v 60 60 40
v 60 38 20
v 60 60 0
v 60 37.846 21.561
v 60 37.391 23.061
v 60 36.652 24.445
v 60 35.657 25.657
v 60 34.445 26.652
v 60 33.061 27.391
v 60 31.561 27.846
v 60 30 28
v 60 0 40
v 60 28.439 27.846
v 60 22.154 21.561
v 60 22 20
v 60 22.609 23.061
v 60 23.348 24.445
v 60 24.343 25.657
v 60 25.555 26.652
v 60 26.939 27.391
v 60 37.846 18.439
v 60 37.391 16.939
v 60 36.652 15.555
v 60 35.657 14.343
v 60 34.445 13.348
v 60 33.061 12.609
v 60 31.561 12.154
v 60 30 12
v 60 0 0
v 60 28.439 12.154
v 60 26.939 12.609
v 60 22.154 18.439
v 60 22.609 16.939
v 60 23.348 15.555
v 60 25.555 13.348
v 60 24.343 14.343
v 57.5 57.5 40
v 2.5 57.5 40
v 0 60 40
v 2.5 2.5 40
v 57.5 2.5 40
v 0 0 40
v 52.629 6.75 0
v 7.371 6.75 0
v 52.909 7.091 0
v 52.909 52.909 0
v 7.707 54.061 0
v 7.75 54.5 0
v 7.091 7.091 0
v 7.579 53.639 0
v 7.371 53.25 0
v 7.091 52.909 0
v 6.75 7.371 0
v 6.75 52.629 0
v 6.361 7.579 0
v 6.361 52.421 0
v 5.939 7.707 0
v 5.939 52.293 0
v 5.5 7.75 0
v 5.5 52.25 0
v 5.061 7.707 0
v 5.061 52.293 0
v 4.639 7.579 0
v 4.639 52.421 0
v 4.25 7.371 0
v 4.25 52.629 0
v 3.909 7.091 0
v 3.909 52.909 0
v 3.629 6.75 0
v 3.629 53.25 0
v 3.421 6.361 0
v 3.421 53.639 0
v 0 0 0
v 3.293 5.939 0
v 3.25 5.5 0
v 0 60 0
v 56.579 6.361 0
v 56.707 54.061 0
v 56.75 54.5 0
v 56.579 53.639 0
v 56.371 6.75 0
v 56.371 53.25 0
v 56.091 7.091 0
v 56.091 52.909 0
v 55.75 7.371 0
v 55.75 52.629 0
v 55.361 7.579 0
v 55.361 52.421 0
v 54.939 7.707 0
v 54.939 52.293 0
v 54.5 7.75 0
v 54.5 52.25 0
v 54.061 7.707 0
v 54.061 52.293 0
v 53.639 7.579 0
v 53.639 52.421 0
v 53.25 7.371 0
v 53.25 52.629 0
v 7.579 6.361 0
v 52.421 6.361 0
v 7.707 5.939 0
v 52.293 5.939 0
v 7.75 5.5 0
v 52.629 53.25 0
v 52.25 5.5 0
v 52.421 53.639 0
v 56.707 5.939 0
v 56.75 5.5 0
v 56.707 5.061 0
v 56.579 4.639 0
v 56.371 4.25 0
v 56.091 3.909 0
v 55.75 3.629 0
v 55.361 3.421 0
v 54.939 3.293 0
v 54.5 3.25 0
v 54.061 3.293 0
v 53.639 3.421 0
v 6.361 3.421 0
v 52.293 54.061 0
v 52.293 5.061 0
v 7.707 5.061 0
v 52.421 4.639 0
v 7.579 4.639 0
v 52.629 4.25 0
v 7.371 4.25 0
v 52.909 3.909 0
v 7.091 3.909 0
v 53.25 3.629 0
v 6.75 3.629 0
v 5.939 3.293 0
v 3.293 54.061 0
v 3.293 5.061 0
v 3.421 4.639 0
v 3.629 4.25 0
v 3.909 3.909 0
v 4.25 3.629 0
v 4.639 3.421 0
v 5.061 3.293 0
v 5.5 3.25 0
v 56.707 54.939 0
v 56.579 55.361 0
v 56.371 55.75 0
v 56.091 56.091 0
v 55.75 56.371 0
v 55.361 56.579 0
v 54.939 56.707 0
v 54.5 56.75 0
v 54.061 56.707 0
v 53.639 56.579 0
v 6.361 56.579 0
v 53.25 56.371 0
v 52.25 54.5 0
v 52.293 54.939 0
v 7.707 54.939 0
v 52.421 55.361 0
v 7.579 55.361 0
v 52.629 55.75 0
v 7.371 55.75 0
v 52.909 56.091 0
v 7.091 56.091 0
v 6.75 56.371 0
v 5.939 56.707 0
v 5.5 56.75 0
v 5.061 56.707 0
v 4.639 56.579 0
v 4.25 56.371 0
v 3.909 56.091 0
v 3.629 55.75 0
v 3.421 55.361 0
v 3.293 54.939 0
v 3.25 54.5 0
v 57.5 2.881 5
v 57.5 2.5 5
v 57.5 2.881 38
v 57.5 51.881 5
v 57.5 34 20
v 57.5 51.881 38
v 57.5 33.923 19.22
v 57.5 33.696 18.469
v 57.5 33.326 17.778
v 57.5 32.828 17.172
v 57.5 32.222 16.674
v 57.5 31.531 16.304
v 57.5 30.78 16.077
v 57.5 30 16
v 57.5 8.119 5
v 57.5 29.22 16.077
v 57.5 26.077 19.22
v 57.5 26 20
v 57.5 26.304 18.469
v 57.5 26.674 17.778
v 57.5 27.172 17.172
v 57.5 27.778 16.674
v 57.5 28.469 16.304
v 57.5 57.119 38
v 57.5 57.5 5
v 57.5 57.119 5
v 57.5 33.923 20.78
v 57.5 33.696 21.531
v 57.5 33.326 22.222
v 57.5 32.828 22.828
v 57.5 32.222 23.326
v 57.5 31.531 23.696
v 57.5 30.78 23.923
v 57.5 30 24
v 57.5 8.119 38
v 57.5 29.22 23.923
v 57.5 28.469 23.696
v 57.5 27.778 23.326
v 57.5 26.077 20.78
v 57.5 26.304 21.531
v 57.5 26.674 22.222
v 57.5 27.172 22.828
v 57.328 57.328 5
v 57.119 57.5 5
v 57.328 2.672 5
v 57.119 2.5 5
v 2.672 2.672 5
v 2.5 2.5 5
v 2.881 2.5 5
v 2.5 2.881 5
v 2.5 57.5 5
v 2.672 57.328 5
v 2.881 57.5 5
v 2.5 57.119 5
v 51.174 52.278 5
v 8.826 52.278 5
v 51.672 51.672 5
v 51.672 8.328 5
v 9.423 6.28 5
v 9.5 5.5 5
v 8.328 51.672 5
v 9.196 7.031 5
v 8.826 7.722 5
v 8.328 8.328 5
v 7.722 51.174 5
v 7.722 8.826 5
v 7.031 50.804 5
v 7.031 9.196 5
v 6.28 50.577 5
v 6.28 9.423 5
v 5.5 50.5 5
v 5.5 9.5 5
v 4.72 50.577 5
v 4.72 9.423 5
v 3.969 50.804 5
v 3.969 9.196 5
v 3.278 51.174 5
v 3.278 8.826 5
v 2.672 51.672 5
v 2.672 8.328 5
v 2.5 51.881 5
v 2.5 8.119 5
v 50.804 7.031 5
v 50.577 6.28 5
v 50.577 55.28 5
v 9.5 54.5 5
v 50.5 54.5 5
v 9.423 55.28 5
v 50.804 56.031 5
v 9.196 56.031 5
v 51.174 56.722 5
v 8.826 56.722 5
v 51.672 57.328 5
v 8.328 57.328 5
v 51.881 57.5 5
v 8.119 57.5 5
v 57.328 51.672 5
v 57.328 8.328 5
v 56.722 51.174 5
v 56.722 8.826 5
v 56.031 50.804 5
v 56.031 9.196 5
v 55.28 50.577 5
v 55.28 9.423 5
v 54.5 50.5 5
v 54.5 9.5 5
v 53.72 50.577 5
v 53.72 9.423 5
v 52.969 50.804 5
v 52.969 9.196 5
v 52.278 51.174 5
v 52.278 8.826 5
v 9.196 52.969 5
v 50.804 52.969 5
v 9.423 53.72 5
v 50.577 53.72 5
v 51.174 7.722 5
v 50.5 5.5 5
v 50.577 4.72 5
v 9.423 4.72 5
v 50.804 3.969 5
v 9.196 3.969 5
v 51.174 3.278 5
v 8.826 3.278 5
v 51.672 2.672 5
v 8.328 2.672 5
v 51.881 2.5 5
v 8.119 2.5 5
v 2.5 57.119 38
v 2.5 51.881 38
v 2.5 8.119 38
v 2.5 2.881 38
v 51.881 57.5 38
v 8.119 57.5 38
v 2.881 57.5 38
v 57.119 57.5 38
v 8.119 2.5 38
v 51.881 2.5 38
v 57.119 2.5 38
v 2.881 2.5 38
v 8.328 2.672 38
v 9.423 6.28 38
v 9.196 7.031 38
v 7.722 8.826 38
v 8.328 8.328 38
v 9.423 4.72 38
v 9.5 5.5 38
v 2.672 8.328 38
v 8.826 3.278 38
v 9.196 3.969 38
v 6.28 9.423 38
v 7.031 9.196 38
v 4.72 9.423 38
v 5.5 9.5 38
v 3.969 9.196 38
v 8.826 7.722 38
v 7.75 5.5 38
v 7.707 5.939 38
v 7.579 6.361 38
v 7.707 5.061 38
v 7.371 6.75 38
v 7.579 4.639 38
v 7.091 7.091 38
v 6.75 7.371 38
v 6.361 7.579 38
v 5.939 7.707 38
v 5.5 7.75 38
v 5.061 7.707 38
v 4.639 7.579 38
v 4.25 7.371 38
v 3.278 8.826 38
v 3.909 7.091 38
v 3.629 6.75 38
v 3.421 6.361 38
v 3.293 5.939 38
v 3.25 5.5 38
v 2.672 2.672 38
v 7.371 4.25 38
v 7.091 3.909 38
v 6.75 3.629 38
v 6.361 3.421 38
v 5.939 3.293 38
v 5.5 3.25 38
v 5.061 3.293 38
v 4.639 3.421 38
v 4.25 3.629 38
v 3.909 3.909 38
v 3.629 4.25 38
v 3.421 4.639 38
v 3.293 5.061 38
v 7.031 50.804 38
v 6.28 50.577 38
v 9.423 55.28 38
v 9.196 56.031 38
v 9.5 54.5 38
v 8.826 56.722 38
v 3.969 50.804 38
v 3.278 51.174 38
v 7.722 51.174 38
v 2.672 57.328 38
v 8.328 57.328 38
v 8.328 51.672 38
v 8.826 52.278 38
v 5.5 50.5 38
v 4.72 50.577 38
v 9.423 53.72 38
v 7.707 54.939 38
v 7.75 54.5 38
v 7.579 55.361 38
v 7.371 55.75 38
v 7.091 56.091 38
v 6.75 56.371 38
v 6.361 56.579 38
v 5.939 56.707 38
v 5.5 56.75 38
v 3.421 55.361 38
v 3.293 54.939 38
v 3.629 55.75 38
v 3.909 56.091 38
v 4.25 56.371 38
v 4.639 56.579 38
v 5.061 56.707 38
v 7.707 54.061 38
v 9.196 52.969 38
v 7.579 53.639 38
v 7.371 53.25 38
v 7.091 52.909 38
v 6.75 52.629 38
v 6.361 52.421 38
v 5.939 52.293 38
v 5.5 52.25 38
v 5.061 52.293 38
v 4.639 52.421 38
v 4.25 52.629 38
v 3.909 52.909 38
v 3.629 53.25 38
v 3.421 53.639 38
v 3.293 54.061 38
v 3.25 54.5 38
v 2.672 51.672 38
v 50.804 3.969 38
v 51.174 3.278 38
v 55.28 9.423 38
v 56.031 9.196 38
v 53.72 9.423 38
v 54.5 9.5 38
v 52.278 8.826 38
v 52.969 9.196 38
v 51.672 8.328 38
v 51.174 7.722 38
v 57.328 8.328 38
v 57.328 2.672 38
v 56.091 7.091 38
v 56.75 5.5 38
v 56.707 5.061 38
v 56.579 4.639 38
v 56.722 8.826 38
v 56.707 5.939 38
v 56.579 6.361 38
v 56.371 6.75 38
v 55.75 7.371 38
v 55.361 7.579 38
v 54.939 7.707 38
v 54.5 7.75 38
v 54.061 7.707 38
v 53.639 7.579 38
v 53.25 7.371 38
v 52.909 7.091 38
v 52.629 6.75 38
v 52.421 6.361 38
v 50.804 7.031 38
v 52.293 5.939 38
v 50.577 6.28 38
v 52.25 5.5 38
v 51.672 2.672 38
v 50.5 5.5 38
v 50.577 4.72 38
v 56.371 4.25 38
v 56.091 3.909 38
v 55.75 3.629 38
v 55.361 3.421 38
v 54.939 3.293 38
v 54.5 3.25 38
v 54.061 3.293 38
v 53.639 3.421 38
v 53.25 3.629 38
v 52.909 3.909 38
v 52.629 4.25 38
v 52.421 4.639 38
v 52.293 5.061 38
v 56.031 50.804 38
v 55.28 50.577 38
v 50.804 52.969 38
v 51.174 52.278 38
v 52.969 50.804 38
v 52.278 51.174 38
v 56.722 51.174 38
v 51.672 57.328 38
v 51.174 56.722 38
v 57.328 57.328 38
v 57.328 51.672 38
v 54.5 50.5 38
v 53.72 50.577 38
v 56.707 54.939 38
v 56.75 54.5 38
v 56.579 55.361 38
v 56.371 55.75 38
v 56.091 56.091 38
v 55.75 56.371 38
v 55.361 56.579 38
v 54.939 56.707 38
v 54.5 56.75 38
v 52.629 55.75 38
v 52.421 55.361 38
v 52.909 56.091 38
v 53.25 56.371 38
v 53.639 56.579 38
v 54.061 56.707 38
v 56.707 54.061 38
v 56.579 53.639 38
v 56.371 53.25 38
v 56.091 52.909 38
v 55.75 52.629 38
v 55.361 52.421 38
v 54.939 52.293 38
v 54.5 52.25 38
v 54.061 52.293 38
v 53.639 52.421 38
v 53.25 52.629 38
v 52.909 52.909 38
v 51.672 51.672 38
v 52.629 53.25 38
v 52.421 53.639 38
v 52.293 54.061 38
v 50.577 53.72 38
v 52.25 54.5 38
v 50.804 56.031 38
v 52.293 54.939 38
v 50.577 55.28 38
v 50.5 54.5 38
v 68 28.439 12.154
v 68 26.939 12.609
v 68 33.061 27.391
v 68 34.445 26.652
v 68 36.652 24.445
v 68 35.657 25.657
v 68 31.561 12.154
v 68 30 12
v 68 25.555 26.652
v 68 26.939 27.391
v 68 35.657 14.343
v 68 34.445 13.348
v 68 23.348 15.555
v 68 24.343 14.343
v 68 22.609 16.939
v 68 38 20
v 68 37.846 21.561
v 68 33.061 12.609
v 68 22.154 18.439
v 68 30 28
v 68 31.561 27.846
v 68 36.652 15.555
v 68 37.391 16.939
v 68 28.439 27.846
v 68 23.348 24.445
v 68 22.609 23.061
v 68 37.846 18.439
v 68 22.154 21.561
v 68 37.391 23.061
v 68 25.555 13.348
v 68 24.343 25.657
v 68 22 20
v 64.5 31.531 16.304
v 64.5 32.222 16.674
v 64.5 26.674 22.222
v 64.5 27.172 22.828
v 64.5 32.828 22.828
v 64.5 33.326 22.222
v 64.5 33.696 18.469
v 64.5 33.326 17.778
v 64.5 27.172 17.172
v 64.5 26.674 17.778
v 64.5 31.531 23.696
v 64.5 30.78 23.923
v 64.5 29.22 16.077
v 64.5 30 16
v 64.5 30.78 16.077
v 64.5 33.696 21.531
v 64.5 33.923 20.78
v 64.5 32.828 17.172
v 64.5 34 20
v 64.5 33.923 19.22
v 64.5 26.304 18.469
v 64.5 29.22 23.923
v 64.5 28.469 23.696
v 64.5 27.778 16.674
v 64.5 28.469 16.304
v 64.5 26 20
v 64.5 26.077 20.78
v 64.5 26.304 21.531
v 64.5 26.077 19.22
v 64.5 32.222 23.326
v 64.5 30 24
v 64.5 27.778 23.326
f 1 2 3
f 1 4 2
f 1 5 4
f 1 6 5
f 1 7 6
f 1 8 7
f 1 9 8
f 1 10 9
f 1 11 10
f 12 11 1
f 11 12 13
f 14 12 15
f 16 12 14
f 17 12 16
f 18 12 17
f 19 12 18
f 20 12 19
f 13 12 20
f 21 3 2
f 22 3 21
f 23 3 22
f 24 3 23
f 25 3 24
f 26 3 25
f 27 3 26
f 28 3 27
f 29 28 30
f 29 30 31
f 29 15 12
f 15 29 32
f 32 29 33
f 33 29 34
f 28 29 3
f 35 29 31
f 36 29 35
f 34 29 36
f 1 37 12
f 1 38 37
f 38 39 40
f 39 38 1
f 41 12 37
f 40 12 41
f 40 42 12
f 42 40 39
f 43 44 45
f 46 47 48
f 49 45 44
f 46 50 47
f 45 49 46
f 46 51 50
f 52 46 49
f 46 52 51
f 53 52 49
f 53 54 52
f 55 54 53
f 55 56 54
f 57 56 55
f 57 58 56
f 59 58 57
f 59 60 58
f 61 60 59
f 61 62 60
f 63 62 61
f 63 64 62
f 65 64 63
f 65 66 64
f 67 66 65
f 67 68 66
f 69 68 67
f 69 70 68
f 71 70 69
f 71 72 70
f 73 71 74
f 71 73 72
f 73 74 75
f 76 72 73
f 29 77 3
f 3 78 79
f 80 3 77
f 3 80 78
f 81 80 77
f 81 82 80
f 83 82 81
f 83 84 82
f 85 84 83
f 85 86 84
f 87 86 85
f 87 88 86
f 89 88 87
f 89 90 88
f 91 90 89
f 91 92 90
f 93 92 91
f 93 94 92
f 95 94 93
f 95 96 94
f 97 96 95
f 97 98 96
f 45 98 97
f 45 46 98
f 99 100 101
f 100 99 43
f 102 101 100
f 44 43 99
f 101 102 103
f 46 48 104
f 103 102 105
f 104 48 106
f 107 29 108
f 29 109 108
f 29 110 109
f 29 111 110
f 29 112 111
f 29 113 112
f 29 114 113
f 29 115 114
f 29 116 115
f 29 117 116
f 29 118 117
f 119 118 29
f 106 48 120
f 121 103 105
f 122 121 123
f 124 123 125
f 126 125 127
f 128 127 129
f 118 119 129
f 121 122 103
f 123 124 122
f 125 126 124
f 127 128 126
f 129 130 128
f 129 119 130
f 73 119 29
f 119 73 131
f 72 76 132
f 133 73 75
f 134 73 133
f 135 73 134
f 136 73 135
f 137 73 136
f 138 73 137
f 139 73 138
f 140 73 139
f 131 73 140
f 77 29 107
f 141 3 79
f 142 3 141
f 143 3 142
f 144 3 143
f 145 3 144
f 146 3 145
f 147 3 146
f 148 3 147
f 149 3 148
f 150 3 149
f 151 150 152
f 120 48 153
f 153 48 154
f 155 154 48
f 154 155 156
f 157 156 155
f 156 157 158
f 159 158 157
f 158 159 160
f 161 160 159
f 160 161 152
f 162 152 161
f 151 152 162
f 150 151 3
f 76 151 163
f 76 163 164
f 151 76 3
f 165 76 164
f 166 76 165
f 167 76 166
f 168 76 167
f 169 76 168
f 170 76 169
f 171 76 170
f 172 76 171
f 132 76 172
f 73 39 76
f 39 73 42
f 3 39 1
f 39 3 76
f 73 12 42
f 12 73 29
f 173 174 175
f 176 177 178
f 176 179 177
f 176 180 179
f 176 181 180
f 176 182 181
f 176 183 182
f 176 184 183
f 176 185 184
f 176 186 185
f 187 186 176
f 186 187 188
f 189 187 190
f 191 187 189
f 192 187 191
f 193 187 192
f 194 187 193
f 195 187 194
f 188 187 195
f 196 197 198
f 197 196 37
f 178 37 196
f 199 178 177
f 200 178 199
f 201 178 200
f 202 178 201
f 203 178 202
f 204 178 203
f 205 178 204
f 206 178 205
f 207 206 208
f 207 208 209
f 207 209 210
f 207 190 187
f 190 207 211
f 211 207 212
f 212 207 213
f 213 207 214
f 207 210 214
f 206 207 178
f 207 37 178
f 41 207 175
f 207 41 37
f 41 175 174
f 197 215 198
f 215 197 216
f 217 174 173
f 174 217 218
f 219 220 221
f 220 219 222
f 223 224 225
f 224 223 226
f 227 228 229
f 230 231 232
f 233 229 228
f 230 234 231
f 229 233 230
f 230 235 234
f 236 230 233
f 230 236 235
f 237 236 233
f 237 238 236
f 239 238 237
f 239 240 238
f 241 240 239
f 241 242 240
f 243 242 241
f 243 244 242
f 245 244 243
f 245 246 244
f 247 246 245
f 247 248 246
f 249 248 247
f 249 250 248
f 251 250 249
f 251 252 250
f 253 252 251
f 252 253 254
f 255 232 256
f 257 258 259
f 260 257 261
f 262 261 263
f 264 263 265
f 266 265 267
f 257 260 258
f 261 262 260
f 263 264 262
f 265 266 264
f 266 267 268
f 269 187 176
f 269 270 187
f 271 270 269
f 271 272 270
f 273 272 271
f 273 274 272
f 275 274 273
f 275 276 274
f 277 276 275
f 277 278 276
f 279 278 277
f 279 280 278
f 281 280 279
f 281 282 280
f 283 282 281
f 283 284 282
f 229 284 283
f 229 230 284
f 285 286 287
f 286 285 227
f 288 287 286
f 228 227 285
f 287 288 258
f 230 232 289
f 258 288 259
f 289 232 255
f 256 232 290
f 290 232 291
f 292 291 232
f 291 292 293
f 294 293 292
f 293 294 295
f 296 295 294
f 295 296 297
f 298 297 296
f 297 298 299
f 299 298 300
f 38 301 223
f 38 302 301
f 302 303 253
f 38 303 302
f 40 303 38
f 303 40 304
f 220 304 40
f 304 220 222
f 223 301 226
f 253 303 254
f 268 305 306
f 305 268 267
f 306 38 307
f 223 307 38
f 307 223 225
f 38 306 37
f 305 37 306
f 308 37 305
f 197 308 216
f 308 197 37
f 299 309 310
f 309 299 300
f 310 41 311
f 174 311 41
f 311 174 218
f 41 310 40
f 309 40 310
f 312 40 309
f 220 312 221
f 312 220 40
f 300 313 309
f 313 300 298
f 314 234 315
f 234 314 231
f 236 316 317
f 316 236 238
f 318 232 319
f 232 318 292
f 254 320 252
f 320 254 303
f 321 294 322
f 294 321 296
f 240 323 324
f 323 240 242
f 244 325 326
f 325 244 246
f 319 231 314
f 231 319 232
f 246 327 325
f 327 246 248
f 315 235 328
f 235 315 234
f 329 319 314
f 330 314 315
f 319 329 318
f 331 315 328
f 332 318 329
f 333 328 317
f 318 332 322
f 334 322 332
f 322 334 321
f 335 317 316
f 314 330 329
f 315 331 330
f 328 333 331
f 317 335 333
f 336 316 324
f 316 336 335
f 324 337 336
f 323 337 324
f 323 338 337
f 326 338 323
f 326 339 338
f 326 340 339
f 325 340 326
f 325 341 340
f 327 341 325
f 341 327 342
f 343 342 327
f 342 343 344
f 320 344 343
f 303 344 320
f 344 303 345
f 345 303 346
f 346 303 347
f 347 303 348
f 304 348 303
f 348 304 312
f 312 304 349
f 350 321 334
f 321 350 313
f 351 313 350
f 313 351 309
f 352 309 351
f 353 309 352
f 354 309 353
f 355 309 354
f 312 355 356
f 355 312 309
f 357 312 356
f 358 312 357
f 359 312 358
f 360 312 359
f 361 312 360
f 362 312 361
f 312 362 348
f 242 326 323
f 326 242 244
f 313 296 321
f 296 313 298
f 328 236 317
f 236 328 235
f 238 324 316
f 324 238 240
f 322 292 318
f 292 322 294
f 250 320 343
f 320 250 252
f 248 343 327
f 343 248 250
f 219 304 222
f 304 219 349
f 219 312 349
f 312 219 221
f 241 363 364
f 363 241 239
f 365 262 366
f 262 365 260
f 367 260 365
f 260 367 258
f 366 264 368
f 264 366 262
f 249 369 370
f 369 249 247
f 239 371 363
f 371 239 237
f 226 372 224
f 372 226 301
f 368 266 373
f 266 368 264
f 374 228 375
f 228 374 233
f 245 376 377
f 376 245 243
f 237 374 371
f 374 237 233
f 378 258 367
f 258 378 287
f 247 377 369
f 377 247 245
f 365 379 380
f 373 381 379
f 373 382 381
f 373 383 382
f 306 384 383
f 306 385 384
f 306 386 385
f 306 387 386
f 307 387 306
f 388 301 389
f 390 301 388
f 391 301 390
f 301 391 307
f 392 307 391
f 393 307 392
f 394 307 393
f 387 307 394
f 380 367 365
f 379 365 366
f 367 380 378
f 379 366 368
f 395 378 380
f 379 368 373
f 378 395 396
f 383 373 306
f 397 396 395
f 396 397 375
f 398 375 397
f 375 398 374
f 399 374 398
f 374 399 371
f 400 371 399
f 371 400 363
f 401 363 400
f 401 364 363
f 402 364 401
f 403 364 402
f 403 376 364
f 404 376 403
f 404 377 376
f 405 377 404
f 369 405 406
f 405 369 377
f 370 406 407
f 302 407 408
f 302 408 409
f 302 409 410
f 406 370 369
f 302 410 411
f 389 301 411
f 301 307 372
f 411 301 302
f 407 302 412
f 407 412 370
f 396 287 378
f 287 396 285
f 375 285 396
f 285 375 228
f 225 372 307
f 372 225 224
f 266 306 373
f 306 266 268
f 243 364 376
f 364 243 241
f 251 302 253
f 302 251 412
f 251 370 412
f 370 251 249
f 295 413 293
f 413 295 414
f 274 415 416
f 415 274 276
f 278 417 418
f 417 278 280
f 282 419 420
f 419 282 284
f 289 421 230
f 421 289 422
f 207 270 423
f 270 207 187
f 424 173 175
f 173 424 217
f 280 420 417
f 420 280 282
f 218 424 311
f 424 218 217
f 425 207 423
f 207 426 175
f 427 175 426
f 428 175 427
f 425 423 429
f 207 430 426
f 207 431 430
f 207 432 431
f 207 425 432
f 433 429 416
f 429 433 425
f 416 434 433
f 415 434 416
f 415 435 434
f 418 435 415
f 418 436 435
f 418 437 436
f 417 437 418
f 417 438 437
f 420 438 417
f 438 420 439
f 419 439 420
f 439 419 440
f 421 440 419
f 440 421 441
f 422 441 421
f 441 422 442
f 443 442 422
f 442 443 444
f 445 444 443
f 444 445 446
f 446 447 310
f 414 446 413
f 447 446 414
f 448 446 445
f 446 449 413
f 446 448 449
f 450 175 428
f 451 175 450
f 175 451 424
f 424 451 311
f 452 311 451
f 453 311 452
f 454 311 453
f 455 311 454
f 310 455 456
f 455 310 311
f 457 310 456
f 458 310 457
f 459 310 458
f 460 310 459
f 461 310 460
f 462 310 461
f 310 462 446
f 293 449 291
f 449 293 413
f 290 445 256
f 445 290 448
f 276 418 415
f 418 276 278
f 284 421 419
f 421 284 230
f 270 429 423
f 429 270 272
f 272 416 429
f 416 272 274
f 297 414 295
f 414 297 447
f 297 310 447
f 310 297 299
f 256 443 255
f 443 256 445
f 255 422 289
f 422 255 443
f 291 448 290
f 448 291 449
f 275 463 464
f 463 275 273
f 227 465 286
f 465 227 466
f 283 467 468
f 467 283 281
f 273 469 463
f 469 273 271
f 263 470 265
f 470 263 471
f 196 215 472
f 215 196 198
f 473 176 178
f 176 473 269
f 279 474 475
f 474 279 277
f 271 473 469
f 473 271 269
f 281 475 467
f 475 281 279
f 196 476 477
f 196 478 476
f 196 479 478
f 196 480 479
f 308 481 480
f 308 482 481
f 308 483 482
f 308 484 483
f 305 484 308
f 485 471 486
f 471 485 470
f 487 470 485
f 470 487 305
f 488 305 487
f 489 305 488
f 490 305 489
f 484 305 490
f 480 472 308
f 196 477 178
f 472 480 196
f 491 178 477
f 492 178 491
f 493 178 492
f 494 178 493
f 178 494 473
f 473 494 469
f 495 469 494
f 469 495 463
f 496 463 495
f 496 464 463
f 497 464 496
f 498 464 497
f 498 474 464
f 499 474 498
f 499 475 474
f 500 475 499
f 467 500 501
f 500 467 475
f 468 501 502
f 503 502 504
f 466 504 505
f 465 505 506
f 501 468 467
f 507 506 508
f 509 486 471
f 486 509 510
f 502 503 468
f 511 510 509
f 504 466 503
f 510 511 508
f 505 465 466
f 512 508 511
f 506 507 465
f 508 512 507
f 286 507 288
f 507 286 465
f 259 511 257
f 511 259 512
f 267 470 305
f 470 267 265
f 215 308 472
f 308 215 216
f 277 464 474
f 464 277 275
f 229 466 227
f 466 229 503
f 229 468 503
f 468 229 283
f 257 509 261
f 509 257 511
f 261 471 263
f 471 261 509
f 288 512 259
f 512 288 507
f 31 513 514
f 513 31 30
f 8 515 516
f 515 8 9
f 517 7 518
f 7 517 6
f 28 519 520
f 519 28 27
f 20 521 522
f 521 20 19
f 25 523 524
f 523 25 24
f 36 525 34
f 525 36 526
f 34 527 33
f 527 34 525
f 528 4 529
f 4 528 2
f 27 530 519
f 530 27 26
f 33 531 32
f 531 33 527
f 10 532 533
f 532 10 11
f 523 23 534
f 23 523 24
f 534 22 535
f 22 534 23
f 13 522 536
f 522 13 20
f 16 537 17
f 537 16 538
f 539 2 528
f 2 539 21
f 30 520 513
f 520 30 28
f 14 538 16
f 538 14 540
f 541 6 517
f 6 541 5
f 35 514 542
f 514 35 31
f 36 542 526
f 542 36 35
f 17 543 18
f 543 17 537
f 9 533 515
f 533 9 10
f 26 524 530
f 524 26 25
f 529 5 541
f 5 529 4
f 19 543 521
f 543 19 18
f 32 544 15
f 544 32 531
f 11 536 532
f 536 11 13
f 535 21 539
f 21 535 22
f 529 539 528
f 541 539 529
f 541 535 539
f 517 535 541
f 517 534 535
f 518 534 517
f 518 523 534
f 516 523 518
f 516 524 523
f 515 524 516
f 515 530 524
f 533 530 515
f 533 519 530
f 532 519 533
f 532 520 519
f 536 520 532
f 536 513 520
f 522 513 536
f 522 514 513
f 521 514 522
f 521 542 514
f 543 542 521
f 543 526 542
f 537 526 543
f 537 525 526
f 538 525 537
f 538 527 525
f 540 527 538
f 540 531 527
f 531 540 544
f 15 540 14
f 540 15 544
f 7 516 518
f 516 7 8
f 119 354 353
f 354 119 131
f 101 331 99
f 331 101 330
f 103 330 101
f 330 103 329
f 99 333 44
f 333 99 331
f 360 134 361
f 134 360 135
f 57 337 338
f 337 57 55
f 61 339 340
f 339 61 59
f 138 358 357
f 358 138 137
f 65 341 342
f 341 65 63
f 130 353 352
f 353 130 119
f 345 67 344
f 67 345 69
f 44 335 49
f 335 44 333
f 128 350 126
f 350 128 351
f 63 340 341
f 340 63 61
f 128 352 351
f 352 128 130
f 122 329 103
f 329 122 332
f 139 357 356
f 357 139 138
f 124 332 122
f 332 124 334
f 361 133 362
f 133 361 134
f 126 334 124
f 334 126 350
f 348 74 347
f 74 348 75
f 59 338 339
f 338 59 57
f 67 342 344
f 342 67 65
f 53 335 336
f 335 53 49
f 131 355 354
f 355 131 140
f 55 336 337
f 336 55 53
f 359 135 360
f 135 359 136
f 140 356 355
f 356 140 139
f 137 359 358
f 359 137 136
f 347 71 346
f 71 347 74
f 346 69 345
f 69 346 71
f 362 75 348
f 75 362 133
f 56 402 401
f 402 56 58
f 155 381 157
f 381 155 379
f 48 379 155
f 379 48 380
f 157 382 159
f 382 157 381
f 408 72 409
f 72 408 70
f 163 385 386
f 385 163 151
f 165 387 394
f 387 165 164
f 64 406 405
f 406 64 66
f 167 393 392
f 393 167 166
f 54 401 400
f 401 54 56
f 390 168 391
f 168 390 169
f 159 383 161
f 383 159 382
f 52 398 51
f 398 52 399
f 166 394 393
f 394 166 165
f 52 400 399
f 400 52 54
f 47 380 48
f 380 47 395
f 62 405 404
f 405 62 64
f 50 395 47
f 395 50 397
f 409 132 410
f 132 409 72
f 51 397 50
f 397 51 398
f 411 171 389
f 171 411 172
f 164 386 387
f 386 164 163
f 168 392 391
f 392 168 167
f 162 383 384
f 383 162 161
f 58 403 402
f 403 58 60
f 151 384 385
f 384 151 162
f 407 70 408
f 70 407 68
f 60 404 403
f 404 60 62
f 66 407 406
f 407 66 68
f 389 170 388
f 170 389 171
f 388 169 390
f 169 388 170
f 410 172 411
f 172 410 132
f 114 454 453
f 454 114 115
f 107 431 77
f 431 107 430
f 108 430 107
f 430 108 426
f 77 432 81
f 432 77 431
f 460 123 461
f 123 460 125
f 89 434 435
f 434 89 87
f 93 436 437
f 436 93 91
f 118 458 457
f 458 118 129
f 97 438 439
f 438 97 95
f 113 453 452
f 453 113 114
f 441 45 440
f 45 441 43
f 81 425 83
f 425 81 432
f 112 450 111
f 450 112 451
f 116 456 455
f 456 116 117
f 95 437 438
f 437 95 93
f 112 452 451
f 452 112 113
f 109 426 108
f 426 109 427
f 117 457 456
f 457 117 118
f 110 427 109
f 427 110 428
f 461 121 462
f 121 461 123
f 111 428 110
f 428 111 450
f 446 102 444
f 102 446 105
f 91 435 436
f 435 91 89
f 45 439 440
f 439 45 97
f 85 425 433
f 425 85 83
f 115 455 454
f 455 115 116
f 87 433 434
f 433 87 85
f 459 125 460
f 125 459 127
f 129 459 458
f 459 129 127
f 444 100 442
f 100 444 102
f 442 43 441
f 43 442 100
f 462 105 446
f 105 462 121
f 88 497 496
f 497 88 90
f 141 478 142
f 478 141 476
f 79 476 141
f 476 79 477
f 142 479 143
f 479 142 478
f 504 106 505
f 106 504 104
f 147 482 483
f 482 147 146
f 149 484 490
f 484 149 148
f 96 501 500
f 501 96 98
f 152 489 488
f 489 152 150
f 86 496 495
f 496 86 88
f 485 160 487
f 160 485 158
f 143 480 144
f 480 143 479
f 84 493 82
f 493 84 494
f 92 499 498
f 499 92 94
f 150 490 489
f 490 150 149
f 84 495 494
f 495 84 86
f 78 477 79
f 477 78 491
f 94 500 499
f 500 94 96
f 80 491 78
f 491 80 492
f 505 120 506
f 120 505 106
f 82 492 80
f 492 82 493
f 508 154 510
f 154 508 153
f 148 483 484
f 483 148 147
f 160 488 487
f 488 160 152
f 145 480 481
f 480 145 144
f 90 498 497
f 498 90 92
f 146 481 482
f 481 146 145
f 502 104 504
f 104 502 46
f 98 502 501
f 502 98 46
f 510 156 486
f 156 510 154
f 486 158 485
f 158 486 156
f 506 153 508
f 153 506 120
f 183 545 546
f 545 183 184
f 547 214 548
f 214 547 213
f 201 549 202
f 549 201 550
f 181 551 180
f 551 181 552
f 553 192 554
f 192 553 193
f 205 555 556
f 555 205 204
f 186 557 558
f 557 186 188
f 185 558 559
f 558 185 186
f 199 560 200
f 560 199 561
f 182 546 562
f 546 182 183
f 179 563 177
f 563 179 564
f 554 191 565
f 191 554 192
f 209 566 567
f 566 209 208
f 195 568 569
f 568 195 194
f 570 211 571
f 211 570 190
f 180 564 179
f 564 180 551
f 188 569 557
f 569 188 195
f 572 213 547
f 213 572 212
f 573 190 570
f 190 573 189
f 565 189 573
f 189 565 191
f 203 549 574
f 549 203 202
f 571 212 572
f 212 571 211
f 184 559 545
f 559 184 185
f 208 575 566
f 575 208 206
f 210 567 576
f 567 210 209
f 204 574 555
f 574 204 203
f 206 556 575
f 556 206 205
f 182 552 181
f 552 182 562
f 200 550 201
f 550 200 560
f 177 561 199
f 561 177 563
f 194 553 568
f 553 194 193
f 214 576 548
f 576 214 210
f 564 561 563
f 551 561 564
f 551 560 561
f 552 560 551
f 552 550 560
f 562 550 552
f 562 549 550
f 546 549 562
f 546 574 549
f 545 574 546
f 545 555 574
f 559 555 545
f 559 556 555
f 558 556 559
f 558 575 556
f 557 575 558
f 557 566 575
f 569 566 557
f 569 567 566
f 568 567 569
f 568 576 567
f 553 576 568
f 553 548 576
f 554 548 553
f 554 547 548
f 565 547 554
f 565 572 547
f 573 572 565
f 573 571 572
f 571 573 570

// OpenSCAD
$fn = 32;

// ----------------------------------------------------------------------
// Enclosure body: 60 x 60 x 40 mm, wall 2.5 mm
// ----------------------------------------------------------------------

// --- parameters (mm) ---
length = 60;              // outside length, X
width = 60;               // outside width, Y
height = 40;              // outside height, Z
wall = 2.5;               // side wall thickness
floor_t = 5;              // floor thickness
boss_d = 8;               // corner boss diameter
boss_h = 33;              // corner boss height above the floor
boss_hole_d = 4.5;        // lid screw clearance in the boss
boss_lip = 5.5;           // boss centre inset from the corner
nipple_d = 16;            // cable gland boss diameter
nipple_h = 8;             // cable gland boss height
nipple_bore = 8;          // cable gland bore

module shell() {
  difference() {
    cube([length, width, height]);
    /* hollow, open at the top */
    translate([wall, wall, floor_t])
      cube([length - 2 * wall, width - 2 * wall, height]);
  }
}

module bosses() {
  /* corner bosses, sunk 1 mm into the floor */
  for (sx = [0, 1]) for (sy = [0, 1])
    translate([sx * (length - 2 * boss_lip) + boss_lip, sy * (width - 2 * boss_lip) + boss_lip, floor_t - 1])
      cylinder(h = boss_h + 1, d = boss_d);
}

module gland() {
  /* boss on the short wall, sunk 1 mm into it */
  translate([length - 1, width / 2, height * 0.5]) rotate([0, 90, 0])
    cylinder(h = nipple_h + 1, d = nipple_d);
}

difference() {
  union() {
    shell();
    bosses();
    gland();
  }
  /* boss screw holes */
  for (sx = [0, 1]) for (sy = [0, 1])
    translate([sx * (length - 2 * boss_lip) + boss_lip, sy * (width - 2 * boss_lip) + boss_lip, -1]) cylinder(h = floor_t + boss_h + 2, d = boss_hole_d);
  translate([length, width / 2, height * 0.5]) rotate([0, 90, 0]) translate([0, 0, -nipple_h - 2]) cylinder(h = nipple_h + wall + 4, d = nipple_bore);
}
